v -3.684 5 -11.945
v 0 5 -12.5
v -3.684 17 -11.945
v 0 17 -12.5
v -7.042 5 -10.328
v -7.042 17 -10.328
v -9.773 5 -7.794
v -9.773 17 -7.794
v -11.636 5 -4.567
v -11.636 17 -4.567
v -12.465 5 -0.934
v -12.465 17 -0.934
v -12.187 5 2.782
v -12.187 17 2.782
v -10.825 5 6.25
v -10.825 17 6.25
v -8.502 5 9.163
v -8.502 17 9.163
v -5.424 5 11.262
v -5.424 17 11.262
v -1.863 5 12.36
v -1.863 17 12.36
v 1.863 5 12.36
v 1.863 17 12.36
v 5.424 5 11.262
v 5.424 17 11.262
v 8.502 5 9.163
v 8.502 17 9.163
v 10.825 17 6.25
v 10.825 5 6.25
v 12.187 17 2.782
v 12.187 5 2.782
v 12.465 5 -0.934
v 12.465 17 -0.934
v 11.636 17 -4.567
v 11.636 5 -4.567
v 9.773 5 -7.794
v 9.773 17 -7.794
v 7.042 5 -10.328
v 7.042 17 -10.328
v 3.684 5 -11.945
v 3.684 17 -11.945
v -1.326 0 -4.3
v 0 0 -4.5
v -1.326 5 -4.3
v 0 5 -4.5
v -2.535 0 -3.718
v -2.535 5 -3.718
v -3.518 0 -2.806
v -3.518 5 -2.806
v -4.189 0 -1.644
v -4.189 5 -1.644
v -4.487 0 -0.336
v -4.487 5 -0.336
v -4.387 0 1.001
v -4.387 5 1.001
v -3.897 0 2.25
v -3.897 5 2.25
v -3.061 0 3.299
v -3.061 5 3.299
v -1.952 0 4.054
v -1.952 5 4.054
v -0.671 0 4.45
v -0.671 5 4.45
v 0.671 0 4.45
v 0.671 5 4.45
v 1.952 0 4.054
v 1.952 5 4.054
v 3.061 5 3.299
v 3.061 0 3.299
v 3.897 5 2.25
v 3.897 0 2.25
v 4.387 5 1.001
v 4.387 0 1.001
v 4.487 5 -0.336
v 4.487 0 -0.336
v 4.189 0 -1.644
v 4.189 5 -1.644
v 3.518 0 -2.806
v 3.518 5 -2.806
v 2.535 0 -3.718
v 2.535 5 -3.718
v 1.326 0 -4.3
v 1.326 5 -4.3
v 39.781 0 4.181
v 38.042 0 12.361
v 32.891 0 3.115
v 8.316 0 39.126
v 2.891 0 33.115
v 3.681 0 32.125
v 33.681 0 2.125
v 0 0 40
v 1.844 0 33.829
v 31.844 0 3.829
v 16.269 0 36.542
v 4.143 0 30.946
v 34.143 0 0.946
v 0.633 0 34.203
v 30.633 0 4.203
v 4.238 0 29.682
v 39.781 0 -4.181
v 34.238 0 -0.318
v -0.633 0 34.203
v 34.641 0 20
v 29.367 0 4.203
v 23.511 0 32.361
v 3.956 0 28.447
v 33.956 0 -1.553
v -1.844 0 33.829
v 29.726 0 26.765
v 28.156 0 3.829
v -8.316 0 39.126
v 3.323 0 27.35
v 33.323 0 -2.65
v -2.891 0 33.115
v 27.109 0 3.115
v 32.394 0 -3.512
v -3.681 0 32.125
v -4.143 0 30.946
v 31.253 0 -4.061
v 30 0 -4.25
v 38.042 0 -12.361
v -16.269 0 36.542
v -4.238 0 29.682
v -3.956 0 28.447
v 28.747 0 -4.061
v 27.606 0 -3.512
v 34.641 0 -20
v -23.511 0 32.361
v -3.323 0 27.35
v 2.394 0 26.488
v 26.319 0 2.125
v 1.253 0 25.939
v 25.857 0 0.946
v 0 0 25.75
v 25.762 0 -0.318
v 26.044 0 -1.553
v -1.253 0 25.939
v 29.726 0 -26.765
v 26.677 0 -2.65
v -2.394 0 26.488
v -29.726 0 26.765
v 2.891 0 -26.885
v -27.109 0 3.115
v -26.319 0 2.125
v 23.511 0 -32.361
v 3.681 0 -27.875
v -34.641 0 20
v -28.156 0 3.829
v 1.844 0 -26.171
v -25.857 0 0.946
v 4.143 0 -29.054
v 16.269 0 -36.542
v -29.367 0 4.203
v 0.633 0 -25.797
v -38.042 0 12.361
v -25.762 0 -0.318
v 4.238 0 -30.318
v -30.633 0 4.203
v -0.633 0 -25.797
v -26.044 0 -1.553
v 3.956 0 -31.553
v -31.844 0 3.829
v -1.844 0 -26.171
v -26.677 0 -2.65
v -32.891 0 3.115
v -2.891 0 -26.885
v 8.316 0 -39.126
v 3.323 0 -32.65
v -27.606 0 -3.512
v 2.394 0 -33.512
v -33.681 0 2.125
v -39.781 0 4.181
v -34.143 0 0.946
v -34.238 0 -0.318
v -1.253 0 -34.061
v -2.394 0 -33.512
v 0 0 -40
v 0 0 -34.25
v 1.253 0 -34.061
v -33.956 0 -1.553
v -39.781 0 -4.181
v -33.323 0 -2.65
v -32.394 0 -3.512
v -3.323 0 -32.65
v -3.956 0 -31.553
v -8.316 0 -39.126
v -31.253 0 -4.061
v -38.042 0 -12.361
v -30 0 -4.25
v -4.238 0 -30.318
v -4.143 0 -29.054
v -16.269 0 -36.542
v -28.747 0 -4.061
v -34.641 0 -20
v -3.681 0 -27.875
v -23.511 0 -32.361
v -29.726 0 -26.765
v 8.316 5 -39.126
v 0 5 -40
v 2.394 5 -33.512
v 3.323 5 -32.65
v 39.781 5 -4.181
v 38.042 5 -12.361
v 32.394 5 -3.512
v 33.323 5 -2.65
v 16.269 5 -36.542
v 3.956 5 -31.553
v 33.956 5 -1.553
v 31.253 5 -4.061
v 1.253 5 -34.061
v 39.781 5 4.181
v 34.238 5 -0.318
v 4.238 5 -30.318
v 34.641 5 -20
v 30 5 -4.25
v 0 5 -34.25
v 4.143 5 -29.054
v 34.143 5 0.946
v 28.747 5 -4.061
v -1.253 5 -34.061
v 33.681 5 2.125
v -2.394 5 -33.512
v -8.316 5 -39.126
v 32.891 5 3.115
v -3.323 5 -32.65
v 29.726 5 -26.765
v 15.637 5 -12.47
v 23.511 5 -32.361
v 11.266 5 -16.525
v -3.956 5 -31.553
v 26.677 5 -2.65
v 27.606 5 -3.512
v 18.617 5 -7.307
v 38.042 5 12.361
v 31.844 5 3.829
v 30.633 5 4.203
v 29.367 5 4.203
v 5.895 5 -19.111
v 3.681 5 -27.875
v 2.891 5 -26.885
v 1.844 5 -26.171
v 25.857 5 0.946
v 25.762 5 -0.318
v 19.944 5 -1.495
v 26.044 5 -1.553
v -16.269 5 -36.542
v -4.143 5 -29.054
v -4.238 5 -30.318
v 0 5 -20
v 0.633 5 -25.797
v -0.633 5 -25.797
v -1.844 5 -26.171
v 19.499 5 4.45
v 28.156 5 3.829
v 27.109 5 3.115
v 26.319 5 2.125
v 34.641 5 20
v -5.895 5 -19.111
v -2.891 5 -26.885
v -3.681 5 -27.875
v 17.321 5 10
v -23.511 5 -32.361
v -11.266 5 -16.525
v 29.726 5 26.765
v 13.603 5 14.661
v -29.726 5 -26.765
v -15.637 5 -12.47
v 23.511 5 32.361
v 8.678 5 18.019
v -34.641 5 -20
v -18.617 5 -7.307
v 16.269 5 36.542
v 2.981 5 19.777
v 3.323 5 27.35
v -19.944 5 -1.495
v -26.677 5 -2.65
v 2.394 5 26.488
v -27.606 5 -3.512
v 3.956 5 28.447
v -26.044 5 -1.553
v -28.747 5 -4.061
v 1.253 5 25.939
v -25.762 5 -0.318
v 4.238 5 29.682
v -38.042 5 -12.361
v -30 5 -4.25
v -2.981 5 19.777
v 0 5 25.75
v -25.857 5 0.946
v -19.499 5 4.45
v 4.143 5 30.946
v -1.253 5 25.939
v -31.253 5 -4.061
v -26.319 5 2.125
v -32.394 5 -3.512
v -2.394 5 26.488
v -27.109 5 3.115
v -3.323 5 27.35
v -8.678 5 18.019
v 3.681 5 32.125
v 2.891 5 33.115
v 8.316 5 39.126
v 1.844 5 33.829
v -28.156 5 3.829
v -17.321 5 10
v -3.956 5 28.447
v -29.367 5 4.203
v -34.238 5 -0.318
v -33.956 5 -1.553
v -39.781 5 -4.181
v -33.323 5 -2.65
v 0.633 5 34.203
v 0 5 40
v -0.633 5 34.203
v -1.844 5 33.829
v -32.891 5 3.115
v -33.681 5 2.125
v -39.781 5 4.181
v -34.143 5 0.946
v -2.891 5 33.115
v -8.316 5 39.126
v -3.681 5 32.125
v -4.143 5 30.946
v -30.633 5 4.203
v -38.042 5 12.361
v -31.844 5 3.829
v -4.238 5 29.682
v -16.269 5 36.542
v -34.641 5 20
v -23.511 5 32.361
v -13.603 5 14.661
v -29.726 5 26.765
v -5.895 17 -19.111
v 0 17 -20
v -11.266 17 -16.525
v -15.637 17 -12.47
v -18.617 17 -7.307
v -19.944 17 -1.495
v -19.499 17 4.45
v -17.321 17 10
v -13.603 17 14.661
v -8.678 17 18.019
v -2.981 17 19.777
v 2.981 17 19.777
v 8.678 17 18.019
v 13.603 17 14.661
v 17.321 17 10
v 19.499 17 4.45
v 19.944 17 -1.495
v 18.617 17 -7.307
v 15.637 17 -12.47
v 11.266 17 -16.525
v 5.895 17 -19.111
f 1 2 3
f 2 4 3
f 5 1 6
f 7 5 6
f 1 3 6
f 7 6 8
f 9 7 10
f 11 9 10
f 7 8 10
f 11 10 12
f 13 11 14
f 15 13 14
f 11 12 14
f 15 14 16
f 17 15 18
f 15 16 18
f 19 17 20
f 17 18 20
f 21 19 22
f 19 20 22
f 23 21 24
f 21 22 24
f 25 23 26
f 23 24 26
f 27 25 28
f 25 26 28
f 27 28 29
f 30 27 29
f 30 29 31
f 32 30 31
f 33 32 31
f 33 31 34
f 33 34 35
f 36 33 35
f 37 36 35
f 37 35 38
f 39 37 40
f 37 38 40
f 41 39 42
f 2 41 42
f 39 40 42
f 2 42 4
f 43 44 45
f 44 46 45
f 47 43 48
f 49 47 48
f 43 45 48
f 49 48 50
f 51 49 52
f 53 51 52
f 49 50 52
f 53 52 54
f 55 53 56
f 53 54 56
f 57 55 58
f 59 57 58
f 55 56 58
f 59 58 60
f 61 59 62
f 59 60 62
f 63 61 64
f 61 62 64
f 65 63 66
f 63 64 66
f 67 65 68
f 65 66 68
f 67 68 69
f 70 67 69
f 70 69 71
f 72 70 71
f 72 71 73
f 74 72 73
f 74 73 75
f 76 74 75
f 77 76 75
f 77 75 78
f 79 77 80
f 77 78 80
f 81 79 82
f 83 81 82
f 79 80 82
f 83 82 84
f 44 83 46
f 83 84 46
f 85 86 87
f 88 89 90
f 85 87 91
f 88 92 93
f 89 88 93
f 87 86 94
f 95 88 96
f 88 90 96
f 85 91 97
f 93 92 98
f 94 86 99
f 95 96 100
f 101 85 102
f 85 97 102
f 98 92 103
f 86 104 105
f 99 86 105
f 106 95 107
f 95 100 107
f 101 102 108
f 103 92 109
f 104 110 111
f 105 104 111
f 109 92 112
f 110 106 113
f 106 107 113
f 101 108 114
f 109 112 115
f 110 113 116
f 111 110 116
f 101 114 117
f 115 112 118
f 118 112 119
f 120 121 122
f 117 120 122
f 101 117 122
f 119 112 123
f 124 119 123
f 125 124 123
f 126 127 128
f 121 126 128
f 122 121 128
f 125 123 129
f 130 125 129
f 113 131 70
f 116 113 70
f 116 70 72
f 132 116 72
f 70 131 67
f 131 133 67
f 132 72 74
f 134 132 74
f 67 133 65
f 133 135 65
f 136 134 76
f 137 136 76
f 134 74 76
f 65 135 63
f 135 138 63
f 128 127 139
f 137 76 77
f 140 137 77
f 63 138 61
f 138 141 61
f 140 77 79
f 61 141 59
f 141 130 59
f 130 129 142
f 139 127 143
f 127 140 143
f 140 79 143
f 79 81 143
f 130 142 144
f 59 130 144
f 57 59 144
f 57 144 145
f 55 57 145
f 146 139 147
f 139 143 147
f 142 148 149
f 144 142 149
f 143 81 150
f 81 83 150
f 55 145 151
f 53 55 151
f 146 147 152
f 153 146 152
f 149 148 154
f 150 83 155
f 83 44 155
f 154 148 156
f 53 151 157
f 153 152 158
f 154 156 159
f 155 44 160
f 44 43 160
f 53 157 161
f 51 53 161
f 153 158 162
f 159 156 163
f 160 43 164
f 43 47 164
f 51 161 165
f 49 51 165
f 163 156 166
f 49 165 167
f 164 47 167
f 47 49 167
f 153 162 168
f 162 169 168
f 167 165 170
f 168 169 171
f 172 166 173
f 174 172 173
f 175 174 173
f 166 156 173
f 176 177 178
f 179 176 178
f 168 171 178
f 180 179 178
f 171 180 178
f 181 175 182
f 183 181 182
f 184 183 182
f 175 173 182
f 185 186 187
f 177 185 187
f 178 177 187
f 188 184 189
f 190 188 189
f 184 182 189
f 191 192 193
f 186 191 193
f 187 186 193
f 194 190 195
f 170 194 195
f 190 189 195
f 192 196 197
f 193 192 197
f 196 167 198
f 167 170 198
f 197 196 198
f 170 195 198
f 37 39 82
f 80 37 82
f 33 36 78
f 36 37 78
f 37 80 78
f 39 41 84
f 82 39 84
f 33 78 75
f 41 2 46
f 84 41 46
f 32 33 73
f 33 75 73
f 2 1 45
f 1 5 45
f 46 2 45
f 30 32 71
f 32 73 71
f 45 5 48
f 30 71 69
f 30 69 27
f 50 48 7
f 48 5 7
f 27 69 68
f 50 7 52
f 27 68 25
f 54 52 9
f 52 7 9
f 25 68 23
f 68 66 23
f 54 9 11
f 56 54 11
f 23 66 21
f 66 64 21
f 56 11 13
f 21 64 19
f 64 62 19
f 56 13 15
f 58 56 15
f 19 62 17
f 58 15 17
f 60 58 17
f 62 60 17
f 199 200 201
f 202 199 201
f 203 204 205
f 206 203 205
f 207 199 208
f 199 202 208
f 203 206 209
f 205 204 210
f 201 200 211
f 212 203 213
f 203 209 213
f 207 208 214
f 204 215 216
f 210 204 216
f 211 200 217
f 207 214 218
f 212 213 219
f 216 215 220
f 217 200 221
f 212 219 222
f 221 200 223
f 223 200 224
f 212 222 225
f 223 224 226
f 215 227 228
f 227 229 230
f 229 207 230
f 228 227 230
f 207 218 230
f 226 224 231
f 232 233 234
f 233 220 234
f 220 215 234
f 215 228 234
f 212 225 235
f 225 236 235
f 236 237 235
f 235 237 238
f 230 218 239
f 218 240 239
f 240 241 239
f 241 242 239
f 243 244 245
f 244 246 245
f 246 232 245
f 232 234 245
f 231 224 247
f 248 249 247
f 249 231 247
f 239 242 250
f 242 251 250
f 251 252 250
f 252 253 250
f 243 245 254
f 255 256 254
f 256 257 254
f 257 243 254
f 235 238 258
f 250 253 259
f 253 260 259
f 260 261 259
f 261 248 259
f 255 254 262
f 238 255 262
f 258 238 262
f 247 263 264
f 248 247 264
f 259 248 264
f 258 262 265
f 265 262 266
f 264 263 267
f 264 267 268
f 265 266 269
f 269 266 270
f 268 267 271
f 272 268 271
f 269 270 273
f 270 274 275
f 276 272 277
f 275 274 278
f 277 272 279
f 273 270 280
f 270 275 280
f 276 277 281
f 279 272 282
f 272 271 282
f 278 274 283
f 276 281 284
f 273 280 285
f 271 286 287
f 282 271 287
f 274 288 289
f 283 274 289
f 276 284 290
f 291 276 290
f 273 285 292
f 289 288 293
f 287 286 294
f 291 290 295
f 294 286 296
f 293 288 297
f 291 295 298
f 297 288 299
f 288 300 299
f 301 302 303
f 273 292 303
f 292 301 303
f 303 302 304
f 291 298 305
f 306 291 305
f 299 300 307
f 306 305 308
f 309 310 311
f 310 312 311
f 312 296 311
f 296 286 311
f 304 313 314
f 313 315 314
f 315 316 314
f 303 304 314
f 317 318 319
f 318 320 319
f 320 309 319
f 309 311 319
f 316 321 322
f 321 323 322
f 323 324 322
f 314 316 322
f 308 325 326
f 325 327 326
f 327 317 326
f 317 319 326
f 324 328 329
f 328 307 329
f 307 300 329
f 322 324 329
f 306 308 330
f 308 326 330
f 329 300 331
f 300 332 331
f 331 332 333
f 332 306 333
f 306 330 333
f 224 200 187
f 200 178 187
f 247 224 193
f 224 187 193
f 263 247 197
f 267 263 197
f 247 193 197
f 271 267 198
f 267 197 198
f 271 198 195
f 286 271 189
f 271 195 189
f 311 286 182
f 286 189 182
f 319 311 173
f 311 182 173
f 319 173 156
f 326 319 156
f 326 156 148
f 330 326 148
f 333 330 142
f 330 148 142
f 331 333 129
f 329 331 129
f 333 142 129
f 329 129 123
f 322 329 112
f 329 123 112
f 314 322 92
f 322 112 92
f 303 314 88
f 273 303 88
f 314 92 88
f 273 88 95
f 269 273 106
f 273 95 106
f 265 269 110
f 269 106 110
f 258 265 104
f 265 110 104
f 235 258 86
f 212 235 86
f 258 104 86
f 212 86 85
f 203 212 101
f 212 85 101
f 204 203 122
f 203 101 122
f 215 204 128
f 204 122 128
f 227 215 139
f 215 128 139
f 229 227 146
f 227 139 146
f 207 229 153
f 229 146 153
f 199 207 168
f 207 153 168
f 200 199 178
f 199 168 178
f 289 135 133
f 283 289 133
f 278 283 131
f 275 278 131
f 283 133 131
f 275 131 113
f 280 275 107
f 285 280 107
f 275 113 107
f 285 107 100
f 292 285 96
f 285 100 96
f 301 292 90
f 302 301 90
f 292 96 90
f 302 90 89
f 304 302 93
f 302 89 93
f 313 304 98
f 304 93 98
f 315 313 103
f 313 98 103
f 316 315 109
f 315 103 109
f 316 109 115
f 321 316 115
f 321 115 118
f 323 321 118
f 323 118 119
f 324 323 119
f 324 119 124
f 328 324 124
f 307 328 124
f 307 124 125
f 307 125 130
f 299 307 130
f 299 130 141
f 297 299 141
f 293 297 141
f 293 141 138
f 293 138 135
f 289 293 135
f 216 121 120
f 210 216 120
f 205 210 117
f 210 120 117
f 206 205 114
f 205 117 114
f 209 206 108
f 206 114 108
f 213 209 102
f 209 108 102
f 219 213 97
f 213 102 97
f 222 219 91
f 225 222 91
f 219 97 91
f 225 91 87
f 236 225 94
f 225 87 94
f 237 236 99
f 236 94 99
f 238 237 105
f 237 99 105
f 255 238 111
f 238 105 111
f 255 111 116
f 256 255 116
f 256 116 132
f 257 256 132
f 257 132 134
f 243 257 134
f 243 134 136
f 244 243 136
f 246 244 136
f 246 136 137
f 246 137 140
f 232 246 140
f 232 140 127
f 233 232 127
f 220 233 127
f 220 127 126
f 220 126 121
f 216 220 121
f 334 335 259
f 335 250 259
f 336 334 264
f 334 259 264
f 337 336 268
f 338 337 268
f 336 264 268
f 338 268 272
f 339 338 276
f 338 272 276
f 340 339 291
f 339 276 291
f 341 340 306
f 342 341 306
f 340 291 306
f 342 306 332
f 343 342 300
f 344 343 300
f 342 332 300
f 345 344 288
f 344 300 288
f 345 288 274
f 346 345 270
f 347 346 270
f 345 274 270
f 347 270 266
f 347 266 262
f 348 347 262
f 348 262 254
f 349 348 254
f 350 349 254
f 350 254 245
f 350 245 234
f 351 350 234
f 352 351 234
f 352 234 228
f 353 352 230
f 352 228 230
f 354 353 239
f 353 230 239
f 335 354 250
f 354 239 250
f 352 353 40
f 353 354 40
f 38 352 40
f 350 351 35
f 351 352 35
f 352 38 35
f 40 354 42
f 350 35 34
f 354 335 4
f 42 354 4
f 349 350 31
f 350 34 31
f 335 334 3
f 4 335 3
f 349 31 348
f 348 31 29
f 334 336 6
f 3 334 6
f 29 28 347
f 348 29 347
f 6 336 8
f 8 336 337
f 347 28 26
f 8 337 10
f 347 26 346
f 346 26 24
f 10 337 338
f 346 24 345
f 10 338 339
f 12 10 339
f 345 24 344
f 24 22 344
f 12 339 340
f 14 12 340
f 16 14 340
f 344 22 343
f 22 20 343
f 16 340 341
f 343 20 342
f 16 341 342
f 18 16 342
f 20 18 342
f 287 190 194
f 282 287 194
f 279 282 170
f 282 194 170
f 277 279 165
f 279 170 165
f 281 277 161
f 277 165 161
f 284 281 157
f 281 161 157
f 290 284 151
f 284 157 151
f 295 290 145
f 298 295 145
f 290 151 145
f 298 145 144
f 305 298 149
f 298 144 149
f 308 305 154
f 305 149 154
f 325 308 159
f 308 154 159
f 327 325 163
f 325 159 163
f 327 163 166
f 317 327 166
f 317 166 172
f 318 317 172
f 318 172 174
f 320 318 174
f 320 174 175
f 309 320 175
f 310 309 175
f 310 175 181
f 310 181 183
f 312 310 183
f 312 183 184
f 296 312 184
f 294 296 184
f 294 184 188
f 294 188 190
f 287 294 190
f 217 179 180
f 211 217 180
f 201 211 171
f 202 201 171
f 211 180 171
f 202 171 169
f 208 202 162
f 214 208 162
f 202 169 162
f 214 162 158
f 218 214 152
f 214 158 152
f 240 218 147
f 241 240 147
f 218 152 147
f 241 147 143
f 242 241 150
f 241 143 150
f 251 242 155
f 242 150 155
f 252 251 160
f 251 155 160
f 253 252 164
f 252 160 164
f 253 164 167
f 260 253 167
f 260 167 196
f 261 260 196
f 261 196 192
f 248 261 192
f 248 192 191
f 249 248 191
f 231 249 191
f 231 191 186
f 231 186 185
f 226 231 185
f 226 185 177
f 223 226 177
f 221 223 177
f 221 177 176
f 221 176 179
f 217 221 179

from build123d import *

# Parameters (mm, degrees)
SKETCH2_R          = 4.25
CUT_EXTRUDE1_DEPTH = 10


with BuildPart() as part:
    # Sketch1 → Revolve1 (revolve)
    with BuildSketch(Plane.XY, mode=Mode.PRIVATE) as revolve1_sk:
        Polygon((4.5, 5), (12.5, 5), (12.5, 17), (20, 17), (20, 5), (40, 5), (40, 0), (4.5, 0), align=None)
    revolve(revolve1_sk.sketch.rotate(Axis((0, 0, 0), (0, 1, 0)), 90), axis=Axis((0, 0, 0), (0, 1, 0)))

    # Sketch2 → Cut-Extrude1 (cut)
    with BuildSketch(Plane.XZ):
        with Locations(Location((0, 30, 0), (0, 0, 270))):
            Circle(SKETCH2_R)
        with Locations(Location((30, 0, 0), (0, 0, 270))):
            Circle(SKETCH2_R)
        with Locations(Location((0, -30, 0), (0, 0, 270))):
            Circle(SKETCH2_R)
        with Locations(Location((-30, 0, 0), (0, 0, 270))):
            Circle(SKETCH2_R)
    extrude(amount=-CUT_EXTRUDE1_DEPTH, mode=Mode.SUBTRACT)


solid = part.part
